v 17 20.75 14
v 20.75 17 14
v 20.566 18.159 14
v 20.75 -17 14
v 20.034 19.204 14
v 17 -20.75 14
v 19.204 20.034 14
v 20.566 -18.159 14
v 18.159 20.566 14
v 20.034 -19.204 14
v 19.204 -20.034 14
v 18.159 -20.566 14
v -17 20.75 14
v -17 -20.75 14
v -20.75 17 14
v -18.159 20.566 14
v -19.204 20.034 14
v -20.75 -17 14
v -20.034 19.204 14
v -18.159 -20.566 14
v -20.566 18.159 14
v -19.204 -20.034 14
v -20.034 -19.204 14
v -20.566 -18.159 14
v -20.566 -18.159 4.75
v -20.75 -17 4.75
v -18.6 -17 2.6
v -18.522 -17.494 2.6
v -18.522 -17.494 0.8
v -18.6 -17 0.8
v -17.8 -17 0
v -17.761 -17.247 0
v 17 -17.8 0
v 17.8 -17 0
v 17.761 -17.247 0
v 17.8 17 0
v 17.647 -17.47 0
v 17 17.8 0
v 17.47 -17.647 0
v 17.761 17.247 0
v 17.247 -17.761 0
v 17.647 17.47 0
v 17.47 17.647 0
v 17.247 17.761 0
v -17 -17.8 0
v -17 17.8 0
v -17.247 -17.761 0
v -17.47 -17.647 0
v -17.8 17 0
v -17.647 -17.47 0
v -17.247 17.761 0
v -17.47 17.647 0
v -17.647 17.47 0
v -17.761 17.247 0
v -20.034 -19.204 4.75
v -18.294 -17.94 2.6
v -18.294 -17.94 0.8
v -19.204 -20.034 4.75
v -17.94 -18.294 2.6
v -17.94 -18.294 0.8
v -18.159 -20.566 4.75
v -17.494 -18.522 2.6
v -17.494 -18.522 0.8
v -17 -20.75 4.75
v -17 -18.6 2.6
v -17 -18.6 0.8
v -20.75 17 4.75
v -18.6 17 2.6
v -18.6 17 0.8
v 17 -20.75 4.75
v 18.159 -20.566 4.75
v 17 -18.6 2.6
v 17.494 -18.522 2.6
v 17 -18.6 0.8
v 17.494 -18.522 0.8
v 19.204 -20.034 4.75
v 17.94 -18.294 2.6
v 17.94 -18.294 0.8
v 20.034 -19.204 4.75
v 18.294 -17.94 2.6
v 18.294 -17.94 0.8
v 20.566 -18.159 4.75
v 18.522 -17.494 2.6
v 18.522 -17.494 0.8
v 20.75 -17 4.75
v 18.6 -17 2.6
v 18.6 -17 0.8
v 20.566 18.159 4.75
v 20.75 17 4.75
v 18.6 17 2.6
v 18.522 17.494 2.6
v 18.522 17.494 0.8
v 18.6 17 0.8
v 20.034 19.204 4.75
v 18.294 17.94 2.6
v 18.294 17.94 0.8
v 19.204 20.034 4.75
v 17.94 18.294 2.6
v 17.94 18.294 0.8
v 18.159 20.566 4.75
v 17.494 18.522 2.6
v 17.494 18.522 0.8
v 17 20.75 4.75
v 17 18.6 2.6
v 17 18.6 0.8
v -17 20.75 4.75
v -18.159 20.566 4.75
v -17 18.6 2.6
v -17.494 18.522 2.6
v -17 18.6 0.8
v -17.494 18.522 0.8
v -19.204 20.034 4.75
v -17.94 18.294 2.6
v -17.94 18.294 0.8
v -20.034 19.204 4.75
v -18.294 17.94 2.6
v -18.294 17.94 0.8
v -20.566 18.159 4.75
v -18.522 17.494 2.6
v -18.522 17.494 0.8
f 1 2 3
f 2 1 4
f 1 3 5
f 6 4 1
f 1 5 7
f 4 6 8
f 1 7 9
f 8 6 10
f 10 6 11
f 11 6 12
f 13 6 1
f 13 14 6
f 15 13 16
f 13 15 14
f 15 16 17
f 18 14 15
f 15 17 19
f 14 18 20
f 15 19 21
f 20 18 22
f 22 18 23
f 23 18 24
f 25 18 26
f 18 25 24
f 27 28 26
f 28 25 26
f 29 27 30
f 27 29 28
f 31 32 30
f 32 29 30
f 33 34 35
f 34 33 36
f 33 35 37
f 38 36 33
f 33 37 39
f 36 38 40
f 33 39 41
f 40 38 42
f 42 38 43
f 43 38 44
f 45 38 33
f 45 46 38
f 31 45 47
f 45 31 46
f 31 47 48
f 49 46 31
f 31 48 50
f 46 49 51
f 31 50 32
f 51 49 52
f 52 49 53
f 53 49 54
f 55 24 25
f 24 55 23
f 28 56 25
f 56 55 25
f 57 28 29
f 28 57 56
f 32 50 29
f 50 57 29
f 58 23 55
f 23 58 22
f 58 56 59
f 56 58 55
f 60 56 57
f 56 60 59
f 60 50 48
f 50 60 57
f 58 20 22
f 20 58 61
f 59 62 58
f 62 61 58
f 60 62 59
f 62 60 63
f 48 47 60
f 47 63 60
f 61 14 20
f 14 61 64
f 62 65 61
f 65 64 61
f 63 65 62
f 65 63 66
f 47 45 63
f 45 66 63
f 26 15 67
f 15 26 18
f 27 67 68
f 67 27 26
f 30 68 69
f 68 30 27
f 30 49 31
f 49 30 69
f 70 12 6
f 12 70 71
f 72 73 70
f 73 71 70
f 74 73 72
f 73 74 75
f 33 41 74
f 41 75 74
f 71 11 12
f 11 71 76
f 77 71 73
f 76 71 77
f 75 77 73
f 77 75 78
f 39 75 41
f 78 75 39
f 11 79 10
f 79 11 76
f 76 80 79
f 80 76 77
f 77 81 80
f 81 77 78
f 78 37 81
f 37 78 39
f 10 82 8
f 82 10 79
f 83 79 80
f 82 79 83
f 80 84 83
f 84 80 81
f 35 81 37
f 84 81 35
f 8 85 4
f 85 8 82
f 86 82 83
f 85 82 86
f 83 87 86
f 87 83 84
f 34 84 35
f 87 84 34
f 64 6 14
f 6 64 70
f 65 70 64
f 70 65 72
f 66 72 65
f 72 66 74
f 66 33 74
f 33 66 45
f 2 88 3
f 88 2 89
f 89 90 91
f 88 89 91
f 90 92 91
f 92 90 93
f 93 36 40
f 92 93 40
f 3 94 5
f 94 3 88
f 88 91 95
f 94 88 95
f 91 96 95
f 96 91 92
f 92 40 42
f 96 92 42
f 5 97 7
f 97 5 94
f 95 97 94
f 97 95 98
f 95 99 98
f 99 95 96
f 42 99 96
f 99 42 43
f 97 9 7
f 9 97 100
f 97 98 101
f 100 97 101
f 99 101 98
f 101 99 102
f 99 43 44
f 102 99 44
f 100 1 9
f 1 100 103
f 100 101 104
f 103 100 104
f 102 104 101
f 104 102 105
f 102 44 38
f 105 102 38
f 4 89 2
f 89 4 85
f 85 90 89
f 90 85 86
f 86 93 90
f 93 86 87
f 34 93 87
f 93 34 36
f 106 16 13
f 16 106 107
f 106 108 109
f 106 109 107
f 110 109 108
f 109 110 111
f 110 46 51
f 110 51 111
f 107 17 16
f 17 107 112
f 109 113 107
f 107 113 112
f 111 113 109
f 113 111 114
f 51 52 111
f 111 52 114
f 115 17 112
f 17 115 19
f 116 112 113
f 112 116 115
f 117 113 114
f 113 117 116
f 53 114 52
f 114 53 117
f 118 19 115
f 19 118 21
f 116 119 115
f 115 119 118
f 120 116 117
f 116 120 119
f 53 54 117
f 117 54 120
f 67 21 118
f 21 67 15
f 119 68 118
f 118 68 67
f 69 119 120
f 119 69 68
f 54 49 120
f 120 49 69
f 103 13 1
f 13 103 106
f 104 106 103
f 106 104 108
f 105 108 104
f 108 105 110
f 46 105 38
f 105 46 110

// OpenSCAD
// file: ../lib/TOGGridfinityLib-v1.scad
/* Edge profile point arrays!
 *
 * Should be listed from bottom to top.
 * - X=0 is at the edge of the cell (*not the slightly narrower block*)
 * - Positive X is the offset into the left side
 * - Y=0 is the floor.
 * - Corner profile point lists start with the base
 *   and go upwards to the side.
 */

// Regular block bottom
tog_gridfinity_block_bottom_corner_profile_points = [
	[3.20, 0.00], // Right end of bottom bevel
	[2.40, 0.80],
	[2.40, 2.60],
	[0.25, 4.75], // Top of left bevel
];

// Block lip, with min(X) = 0.25
tog_gridfinity_block_lip_corner_profile_points = [
	[2.85, 0.00], // Right end of bottom bevel
	[2.15, 0.70],
	[2.15, 2.50],
	[0.25, 4.20], // Top tip
];

// Full-cell lip.   Starts at cell edge instead of 0.25 inward for blocks.
// Alternatively one could always use this and just intersect with the block hull,
// (or subtracting the inverse)
// which may be simpler especially if making blocks with a grid on top.
tog_gridfinity_full_lip_corner_profile_points = [
	[2.85, 0.00], // Right end of bottom bevel
	[2.15, 0.70],
	[2.15, 2.50],
	[0.00, 4.65], // Top tip
];

function tog_gridfinity_make_corner_extrudable_points(corner_profile_points, margin, block_height=7, corner_radius=4) = [
	[0, 0],
	for( point=corner_profile_points ) [point[0] - corner_radius, point[1]],
	[margin - corner_radius, block_height],
	[0, block_height],
];

function tog_gridfinity_reverse_list(list) = [
	for( i=[len(list)-1: -1 : 0] ) list[i]
];

/**
 * Reverses the list of points for use as a cutout at the top of a block
 * and also adds some amount of Y
 */
//function tog_gridfinity_adjusted_lip_points(point_list, delta_y=0) = [
//	for( i=[len(list)-1: -1 : 0] ) list[i]
//];

// Extrudable points for an entire block, with lip, filled to the specified height
function tog_gridfinity_make_block_with_lip_extrudable_points( block_height, floor_height=7, corner_radius=4, wall_thickness=2 ) = [
	[0, 0],
	for( point=tog_gridfinity_block_bottom_corner_profile_points ) [point[0] - corner_radius, point[1]],
	for( point=tog_gridfinity_reverse_list(tog_gridfinity_block_lip_corner_profile_points) ) [point[0] - corner_radius, point[1] + block_height],
	each (floor_height == block_height ? [] : [
		// TODO: Really want to filter this list of down-the-inside-of-the-lip points
		// based on being >= floor height.
		// If floor_height is too close to block_height, I imagine this could be a mess:
		[tog_gridfinity_block_lip_corner_profile_points[0][0] - corner_radius, max(floor_height, block_height-2)], // 2 is probably fine; really want a max. 45deg from wall thickness to innermost point in lip
		[wall_thickness+0.25 - corner_radius, max(floor_height, block_height-4)], // difference y=-2 is probably fine; really want a max. 45deg from wall thickness to innermost point in lip
		[wall_thickness+0.25 - corner_radius, floor_height+(corner_radius-wall_thickness-0.25)],
		[0, floor_height],
	]),
	[0, floor_height],,
	//[tog_gridfinity_block_lip_corner_profile_points[0][0] - corner_radius, floor_height],
];

// Create full extrudable polygon where x=0 refers to the pivot point
function tog_gridfinity_make_block_bottom_corner_extrudable_points(block_height=7, corner_radius=4) = tog_gridfinity_make_corner_extrudable_points(
	tog_gridfinity_block_bottom_corner_profile_points,
	0.25,
	block_height=block_height,
	corner_radius=corner_radius
);

module tog_gridfinity_block_from_profile_points(profile_points, block_width=42, corner_radius=4, overlap=0) {
	bottom_z = profile_points[0][1];
	top_z    = profile_points[len(profile_points)-1][1];
	for( r=[0:90:270] ) rotate([0,0,r]) {
		translate([-block_width/2+corner_radius, -block_width/2+corner_radius, 0]) {
			rotate_extrude(angle=90) {
				polygon(profile_points);
			}
		}
		translate([-block_width/2+corner_radius, 0, 0]) {
			rotate([90,0,0]) linear_extrude(block_width-2*corner_radius+overlap*2, center=true) {
				polygon(profile_points);
			}
		}
	}
	translate([0,0,(bottom_z+top_z)/2]) cube([block_width-corner_radius*2+overlap*2, block_width-corner_radius*2+overlap*2, top_z-bottom_z], center=true);
}


/**
 * Hull to be intersected with block bottoms for gridfinity compatibility.
 * Overlap=0 seems to work, but it can be set to a small value, like 1/64,
 * if OpenSCAD gets confused about exactly interfacing surfaces.
 */
module tog_gridfinity_block_bottom(height=14, gridfinity_pitch=42, corner_radius=4, overlap=0) {
	tog_gridfinity_block_from_profile_points(tog_gridfinity_make_block_bottom_corner_extrudable_points(height, corner_radius), gridfinity_pitch, corner_radius, overlap);
}

module tog_gridfinity_block_with_lip(
	height=14, floor_height=7,
	gridfinity_pitch=42, corner_radius=4, overlap=0,
	magnet_hole_diameter=6.5,
	magnet_hole_depth=2.4,
) {
	difference() {
		tog_gridfinity_block_from_profile_points(tog_gridfinity_make_block_with_lip_extrudable_points(height, floor_height, corner_radius), gridfinity_pitch, corner_radius, overlap);
		if( magnet_hole_diameter > 0 && magnet_hole_depth > 0 ) for( ym=[-1,1] ) for( xm=[-1,1] ) {
			translate([13*xm, 13*ym, 0]) cylinder(d=magnet_hole_diameter, h=magnet_hole_depth*2, center=true);
		}
	}
}
// main file
$fn = 20;

include <../lib/TOGGridfinityLib-v1.scad>

tog_gridfinity_block_bottom(14, 42, 4);
